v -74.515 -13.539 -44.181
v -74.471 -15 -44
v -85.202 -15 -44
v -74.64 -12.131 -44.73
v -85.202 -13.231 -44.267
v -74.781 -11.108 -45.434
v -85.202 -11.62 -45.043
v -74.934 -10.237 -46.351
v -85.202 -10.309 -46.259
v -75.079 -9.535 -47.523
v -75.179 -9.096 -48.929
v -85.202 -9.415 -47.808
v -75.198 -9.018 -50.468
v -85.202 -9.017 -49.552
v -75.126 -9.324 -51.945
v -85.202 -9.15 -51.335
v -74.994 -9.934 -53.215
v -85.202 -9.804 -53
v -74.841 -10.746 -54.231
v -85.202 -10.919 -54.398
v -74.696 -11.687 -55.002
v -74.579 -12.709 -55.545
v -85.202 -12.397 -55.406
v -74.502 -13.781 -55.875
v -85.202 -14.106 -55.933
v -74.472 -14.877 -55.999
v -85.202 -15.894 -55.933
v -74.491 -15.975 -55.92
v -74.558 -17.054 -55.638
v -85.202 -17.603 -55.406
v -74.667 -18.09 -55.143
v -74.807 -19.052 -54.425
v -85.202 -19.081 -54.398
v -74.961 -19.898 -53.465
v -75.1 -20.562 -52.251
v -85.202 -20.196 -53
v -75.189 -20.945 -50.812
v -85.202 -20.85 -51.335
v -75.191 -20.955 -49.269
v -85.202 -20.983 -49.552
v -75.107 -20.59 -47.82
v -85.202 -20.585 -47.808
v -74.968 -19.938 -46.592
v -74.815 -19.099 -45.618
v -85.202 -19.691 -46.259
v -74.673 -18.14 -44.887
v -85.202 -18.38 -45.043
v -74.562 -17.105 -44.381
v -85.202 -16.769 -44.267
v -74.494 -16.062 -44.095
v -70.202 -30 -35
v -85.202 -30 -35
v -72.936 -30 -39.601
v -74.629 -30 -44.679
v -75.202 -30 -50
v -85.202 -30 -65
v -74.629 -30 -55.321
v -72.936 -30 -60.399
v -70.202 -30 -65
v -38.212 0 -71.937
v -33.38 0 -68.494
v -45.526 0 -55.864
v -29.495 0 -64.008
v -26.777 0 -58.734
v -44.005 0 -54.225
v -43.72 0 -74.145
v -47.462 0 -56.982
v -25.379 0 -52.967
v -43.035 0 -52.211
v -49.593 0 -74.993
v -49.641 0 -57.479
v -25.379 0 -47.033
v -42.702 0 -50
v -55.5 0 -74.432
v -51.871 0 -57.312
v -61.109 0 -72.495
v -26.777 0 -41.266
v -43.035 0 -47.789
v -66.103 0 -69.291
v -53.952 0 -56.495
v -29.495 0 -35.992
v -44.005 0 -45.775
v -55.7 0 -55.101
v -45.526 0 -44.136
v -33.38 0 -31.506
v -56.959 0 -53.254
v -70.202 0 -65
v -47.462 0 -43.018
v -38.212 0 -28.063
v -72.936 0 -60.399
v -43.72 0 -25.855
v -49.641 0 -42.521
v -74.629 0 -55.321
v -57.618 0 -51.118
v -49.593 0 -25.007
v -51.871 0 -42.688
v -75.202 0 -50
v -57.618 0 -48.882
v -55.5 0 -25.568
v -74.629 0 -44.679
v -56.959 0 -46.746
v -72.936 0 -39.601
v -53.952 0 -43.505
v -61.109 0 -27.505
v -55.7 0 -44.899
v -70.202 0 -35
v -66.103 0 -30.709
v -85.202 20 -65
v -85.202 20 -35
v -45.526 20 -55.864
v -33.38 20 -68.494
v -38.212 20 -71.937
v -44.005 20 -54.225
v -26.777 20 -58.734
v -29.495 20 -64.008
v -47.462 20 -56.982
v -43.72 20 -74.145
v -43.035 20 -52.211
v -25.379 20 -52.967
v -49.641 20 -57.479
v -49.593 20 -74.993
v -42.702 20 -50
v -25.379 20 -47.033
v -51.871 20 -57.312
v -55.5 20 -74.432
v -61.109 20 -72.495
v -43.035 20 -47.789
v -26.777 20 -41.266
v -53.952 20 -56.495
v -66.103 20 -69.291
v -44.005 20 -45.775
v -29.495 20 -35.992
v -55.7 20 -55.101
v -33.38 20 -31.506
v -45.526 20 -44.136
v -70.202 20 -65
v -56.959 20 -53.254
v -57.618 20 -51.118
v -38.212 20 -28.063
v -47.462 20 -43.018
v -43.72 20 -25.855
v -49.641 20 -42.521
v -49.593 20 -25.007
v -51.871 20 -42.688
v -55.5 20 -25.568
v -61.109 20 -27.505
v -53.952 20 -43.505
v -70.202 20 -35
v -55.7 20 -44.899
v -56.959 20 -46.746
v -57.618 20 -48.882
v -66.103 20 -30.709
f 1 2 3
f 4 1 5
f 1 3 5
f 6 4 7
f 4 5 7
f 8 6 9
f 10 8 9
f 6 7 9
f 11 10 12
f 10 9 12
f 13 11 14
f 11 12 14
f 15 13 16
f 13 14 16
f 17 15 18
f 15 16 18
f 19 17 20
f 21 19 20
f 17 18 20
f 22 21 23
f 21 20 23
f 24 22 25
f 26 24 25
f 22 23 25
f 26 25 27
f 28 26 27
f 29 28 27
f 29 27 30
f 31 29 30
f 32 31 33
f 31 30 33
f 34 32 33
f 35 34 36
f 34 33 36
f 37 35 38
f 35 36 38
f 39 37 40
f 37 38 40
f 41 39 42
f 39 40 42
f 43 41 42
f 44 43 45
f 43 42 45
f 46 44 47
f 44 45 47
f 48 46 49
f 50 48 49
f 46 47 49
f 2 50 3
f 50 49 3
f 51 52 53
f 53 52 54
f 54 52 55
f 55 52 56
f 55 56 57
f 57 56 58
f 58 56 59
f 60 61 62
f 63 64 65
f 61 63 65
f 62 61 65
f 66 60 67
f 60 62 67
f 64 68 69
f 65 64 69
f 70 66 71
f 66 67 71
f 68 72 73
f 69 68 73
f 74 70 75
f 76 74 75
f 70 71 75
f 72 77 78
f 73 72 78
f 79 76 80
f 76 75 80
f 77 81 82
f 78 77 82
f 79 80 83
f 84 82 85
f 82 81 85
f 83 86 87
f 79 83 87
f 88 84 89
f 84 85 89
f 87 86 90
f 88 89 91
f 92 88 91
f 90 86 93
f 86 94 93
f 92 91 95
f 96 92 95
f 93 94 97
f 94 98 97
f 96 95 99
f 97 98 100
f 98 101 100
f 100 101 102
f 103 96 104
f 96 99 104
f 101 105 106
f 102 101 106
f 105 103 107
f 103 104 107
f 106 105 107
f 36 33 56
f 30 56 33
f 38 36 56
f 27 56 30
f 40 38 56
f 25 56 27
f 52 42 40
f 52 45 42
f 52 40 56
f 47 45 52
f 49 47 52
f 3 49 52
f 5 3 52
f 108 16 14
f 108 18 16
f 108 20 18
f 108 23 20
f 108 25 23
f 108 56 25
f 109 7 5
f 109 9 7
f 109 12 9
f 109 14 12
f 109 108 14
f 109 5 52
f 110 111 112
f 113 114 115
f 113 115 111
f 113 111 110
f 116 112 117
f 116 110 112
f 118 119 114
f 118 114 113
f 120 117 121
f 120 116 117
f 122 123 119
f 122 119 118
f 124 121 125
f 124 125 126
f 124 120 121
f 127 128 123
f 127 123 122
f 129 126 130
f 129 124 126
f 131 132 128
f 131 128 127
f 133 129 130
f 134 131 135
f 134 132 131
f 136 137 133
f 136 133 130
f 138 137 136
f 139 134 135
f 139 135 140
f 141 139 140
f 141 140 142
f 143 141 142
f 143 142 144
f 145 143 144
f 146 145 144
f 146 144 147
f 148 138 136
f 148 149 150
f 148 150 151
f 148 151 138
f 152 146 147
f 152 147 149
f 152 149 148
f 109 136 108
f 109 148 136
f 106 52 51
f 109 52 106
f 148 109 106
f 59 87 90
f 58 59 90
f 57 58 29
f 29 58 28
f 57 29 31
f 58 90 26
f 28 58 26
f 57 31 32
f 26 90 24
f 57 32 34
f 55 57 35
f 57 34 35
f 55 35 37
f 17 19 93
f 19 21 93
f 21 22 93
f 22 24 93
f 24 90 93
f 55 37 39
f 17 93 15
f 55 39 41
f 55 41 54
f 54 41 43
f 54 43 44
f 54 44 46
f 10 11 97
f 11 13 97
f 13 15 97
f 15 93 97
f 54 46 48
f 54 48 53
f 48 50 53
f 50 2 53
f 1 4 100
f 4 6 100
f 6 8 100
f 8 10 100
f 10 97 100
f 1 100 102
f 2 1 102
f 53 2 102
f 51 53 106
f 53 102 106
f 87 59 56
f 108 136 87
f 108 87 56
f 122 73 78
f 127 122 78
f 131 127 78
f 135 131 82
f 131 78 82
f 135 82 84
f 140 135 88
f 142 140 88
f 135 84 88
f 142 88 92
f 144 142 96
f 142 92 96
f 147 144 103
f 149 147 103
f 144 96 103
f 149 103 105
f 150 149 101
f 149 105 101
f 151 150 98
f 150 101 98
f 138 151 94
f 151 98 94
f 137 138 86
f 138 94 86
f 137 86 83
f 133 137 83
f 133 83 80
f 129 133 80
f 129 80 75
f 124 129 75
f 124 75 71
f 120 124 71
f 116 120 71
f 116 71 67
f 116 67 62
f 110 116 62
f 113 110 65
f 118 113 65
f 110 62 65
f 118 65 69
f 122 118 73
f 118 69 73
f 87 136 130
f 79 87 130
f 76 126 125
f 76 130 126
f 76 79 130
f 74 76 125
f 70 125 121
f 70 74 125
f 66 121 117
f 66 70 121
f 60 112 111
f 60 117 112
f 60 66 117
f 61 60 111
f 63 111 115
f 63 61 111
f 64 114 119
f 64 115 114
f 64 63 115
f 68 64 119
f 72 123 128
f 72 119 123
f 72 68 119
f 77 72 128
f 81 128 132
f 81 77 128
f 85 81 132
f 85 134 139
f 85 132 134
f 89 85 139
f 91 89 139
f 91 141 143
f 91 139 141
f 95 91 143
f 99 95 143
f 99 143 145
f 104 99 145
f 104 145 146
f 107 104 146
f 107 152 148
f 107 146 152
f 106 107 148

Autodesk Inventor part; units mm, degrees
ref_plane "YZ Plane" through (0, 0, 0) normal (1, 0, 0) x (0, 1, 0)
ref_plane "XZ Plane" through (0, 0, 0) normal (0, 1, 0) x (-1, 0, 0)
ref_plane "XY Plane" through (0, 0, 0) normal (0, 0, 1) x (1, 0, 0)
sketch "Sketch1" plane through (0, 0, 0) normal (0, 1, 0) x (-1, 0, 0)
  circle A0 centre (50.2019, -50) radius 25
  point P0 (0, 0)
  dimension "d0" = 50
  dimension "d1" = 50
extrude "Extrusion1" add sketch "Sketch1" along normal blind 20
sketch "Sketch2" plane through (-50.2019, 20, -50) normal (0, 1, 0) x (1, 0, 0)
  line L0 (-35, -15) -> (-16.3886, -15)
  line L1 (-16.3886, -15) -> (-16.3886, 15)
  line L2 (-16.3886, 15) -> (-35, 15)
  line L3 (-35, 15) -> (-35, -15)
  circle A0 centre (0, 0) radius 25 projected
  circle A1 centre (0, 0) radius 25 projected
  point P0 (50.2019, -50)
  point P1 (0, 25)
  point P2 (0, -25)
  point P3 (-20, -15)
  point P4 (-20, 15)
  dimension "d4" = 15
  dimension "d5" = 15
  dimension "d6" = 35
  dimension "d7" = 50
extrude "Extrusion2" add sketch "Sketch2" against normal blind 50 contours L3 L2 A0 L0
sketch "Sketch3" plane through (0, 0, 0) normal (0, -1, 0) x (1, 0, 0)
  arc A0 (-70.2019, -65) -> (-70.2019, -35) centre (-50.2019, -50) ccw projected
  arc A1 (-70.2019, -35) -> (-70.2019, -65) centre (-50.2019, -50) ccw projected
  circle A2 centre (-50.2019, -50) radius 7.5
  point P0 (0, 0)
  point P1 (-50.2019, -75)
  point P2 (-50.2019, -25)
  point P3 (-75.2019, -50)
  point P4 (-25.01, -50)
  dimension "d10" = 15
  dimension "d11" = 25
extrude "Extrusion3" cut sketch "Sketch3" against normal blind 30 contours A2
sketch "Sketch4" plane through (-85.2019, 20, -65) normal (-1, 0, 0) x (0, 0, 1)
  line L0 (0, -20) -> (0, -50) projected
  line L1 (30, -20) -> (30, -50) projected
  line L2 (30, -50) -> (0, -50) projected
  line L3 (40, -20) -> (-10, -20) projected
  circle A0 centre (15, -35) radius 6
  point P0 (65, -20)
  point P1 (0, -35)
  point P2 (30, -35)
  point P3 (15, -50)
  point P4 (15, -20)
  point P5 (15, -20)
  dimension "d14" = 30
  dimension "d15" = 15
  dimension "d16" = 15
  dimension "d17" = 12
extrude "Extrusion4" cut sketch "Sketch4" against normal blind 30 contours A0
equation "\"d10\" = 0.6 * d11"
equation "\"d15\" = 0.5 * d14"
equation "\"d16\" = 0.5 * d14"
equation "\"d17\" = 0.4 * d14"
properties part number "KeelHook"
